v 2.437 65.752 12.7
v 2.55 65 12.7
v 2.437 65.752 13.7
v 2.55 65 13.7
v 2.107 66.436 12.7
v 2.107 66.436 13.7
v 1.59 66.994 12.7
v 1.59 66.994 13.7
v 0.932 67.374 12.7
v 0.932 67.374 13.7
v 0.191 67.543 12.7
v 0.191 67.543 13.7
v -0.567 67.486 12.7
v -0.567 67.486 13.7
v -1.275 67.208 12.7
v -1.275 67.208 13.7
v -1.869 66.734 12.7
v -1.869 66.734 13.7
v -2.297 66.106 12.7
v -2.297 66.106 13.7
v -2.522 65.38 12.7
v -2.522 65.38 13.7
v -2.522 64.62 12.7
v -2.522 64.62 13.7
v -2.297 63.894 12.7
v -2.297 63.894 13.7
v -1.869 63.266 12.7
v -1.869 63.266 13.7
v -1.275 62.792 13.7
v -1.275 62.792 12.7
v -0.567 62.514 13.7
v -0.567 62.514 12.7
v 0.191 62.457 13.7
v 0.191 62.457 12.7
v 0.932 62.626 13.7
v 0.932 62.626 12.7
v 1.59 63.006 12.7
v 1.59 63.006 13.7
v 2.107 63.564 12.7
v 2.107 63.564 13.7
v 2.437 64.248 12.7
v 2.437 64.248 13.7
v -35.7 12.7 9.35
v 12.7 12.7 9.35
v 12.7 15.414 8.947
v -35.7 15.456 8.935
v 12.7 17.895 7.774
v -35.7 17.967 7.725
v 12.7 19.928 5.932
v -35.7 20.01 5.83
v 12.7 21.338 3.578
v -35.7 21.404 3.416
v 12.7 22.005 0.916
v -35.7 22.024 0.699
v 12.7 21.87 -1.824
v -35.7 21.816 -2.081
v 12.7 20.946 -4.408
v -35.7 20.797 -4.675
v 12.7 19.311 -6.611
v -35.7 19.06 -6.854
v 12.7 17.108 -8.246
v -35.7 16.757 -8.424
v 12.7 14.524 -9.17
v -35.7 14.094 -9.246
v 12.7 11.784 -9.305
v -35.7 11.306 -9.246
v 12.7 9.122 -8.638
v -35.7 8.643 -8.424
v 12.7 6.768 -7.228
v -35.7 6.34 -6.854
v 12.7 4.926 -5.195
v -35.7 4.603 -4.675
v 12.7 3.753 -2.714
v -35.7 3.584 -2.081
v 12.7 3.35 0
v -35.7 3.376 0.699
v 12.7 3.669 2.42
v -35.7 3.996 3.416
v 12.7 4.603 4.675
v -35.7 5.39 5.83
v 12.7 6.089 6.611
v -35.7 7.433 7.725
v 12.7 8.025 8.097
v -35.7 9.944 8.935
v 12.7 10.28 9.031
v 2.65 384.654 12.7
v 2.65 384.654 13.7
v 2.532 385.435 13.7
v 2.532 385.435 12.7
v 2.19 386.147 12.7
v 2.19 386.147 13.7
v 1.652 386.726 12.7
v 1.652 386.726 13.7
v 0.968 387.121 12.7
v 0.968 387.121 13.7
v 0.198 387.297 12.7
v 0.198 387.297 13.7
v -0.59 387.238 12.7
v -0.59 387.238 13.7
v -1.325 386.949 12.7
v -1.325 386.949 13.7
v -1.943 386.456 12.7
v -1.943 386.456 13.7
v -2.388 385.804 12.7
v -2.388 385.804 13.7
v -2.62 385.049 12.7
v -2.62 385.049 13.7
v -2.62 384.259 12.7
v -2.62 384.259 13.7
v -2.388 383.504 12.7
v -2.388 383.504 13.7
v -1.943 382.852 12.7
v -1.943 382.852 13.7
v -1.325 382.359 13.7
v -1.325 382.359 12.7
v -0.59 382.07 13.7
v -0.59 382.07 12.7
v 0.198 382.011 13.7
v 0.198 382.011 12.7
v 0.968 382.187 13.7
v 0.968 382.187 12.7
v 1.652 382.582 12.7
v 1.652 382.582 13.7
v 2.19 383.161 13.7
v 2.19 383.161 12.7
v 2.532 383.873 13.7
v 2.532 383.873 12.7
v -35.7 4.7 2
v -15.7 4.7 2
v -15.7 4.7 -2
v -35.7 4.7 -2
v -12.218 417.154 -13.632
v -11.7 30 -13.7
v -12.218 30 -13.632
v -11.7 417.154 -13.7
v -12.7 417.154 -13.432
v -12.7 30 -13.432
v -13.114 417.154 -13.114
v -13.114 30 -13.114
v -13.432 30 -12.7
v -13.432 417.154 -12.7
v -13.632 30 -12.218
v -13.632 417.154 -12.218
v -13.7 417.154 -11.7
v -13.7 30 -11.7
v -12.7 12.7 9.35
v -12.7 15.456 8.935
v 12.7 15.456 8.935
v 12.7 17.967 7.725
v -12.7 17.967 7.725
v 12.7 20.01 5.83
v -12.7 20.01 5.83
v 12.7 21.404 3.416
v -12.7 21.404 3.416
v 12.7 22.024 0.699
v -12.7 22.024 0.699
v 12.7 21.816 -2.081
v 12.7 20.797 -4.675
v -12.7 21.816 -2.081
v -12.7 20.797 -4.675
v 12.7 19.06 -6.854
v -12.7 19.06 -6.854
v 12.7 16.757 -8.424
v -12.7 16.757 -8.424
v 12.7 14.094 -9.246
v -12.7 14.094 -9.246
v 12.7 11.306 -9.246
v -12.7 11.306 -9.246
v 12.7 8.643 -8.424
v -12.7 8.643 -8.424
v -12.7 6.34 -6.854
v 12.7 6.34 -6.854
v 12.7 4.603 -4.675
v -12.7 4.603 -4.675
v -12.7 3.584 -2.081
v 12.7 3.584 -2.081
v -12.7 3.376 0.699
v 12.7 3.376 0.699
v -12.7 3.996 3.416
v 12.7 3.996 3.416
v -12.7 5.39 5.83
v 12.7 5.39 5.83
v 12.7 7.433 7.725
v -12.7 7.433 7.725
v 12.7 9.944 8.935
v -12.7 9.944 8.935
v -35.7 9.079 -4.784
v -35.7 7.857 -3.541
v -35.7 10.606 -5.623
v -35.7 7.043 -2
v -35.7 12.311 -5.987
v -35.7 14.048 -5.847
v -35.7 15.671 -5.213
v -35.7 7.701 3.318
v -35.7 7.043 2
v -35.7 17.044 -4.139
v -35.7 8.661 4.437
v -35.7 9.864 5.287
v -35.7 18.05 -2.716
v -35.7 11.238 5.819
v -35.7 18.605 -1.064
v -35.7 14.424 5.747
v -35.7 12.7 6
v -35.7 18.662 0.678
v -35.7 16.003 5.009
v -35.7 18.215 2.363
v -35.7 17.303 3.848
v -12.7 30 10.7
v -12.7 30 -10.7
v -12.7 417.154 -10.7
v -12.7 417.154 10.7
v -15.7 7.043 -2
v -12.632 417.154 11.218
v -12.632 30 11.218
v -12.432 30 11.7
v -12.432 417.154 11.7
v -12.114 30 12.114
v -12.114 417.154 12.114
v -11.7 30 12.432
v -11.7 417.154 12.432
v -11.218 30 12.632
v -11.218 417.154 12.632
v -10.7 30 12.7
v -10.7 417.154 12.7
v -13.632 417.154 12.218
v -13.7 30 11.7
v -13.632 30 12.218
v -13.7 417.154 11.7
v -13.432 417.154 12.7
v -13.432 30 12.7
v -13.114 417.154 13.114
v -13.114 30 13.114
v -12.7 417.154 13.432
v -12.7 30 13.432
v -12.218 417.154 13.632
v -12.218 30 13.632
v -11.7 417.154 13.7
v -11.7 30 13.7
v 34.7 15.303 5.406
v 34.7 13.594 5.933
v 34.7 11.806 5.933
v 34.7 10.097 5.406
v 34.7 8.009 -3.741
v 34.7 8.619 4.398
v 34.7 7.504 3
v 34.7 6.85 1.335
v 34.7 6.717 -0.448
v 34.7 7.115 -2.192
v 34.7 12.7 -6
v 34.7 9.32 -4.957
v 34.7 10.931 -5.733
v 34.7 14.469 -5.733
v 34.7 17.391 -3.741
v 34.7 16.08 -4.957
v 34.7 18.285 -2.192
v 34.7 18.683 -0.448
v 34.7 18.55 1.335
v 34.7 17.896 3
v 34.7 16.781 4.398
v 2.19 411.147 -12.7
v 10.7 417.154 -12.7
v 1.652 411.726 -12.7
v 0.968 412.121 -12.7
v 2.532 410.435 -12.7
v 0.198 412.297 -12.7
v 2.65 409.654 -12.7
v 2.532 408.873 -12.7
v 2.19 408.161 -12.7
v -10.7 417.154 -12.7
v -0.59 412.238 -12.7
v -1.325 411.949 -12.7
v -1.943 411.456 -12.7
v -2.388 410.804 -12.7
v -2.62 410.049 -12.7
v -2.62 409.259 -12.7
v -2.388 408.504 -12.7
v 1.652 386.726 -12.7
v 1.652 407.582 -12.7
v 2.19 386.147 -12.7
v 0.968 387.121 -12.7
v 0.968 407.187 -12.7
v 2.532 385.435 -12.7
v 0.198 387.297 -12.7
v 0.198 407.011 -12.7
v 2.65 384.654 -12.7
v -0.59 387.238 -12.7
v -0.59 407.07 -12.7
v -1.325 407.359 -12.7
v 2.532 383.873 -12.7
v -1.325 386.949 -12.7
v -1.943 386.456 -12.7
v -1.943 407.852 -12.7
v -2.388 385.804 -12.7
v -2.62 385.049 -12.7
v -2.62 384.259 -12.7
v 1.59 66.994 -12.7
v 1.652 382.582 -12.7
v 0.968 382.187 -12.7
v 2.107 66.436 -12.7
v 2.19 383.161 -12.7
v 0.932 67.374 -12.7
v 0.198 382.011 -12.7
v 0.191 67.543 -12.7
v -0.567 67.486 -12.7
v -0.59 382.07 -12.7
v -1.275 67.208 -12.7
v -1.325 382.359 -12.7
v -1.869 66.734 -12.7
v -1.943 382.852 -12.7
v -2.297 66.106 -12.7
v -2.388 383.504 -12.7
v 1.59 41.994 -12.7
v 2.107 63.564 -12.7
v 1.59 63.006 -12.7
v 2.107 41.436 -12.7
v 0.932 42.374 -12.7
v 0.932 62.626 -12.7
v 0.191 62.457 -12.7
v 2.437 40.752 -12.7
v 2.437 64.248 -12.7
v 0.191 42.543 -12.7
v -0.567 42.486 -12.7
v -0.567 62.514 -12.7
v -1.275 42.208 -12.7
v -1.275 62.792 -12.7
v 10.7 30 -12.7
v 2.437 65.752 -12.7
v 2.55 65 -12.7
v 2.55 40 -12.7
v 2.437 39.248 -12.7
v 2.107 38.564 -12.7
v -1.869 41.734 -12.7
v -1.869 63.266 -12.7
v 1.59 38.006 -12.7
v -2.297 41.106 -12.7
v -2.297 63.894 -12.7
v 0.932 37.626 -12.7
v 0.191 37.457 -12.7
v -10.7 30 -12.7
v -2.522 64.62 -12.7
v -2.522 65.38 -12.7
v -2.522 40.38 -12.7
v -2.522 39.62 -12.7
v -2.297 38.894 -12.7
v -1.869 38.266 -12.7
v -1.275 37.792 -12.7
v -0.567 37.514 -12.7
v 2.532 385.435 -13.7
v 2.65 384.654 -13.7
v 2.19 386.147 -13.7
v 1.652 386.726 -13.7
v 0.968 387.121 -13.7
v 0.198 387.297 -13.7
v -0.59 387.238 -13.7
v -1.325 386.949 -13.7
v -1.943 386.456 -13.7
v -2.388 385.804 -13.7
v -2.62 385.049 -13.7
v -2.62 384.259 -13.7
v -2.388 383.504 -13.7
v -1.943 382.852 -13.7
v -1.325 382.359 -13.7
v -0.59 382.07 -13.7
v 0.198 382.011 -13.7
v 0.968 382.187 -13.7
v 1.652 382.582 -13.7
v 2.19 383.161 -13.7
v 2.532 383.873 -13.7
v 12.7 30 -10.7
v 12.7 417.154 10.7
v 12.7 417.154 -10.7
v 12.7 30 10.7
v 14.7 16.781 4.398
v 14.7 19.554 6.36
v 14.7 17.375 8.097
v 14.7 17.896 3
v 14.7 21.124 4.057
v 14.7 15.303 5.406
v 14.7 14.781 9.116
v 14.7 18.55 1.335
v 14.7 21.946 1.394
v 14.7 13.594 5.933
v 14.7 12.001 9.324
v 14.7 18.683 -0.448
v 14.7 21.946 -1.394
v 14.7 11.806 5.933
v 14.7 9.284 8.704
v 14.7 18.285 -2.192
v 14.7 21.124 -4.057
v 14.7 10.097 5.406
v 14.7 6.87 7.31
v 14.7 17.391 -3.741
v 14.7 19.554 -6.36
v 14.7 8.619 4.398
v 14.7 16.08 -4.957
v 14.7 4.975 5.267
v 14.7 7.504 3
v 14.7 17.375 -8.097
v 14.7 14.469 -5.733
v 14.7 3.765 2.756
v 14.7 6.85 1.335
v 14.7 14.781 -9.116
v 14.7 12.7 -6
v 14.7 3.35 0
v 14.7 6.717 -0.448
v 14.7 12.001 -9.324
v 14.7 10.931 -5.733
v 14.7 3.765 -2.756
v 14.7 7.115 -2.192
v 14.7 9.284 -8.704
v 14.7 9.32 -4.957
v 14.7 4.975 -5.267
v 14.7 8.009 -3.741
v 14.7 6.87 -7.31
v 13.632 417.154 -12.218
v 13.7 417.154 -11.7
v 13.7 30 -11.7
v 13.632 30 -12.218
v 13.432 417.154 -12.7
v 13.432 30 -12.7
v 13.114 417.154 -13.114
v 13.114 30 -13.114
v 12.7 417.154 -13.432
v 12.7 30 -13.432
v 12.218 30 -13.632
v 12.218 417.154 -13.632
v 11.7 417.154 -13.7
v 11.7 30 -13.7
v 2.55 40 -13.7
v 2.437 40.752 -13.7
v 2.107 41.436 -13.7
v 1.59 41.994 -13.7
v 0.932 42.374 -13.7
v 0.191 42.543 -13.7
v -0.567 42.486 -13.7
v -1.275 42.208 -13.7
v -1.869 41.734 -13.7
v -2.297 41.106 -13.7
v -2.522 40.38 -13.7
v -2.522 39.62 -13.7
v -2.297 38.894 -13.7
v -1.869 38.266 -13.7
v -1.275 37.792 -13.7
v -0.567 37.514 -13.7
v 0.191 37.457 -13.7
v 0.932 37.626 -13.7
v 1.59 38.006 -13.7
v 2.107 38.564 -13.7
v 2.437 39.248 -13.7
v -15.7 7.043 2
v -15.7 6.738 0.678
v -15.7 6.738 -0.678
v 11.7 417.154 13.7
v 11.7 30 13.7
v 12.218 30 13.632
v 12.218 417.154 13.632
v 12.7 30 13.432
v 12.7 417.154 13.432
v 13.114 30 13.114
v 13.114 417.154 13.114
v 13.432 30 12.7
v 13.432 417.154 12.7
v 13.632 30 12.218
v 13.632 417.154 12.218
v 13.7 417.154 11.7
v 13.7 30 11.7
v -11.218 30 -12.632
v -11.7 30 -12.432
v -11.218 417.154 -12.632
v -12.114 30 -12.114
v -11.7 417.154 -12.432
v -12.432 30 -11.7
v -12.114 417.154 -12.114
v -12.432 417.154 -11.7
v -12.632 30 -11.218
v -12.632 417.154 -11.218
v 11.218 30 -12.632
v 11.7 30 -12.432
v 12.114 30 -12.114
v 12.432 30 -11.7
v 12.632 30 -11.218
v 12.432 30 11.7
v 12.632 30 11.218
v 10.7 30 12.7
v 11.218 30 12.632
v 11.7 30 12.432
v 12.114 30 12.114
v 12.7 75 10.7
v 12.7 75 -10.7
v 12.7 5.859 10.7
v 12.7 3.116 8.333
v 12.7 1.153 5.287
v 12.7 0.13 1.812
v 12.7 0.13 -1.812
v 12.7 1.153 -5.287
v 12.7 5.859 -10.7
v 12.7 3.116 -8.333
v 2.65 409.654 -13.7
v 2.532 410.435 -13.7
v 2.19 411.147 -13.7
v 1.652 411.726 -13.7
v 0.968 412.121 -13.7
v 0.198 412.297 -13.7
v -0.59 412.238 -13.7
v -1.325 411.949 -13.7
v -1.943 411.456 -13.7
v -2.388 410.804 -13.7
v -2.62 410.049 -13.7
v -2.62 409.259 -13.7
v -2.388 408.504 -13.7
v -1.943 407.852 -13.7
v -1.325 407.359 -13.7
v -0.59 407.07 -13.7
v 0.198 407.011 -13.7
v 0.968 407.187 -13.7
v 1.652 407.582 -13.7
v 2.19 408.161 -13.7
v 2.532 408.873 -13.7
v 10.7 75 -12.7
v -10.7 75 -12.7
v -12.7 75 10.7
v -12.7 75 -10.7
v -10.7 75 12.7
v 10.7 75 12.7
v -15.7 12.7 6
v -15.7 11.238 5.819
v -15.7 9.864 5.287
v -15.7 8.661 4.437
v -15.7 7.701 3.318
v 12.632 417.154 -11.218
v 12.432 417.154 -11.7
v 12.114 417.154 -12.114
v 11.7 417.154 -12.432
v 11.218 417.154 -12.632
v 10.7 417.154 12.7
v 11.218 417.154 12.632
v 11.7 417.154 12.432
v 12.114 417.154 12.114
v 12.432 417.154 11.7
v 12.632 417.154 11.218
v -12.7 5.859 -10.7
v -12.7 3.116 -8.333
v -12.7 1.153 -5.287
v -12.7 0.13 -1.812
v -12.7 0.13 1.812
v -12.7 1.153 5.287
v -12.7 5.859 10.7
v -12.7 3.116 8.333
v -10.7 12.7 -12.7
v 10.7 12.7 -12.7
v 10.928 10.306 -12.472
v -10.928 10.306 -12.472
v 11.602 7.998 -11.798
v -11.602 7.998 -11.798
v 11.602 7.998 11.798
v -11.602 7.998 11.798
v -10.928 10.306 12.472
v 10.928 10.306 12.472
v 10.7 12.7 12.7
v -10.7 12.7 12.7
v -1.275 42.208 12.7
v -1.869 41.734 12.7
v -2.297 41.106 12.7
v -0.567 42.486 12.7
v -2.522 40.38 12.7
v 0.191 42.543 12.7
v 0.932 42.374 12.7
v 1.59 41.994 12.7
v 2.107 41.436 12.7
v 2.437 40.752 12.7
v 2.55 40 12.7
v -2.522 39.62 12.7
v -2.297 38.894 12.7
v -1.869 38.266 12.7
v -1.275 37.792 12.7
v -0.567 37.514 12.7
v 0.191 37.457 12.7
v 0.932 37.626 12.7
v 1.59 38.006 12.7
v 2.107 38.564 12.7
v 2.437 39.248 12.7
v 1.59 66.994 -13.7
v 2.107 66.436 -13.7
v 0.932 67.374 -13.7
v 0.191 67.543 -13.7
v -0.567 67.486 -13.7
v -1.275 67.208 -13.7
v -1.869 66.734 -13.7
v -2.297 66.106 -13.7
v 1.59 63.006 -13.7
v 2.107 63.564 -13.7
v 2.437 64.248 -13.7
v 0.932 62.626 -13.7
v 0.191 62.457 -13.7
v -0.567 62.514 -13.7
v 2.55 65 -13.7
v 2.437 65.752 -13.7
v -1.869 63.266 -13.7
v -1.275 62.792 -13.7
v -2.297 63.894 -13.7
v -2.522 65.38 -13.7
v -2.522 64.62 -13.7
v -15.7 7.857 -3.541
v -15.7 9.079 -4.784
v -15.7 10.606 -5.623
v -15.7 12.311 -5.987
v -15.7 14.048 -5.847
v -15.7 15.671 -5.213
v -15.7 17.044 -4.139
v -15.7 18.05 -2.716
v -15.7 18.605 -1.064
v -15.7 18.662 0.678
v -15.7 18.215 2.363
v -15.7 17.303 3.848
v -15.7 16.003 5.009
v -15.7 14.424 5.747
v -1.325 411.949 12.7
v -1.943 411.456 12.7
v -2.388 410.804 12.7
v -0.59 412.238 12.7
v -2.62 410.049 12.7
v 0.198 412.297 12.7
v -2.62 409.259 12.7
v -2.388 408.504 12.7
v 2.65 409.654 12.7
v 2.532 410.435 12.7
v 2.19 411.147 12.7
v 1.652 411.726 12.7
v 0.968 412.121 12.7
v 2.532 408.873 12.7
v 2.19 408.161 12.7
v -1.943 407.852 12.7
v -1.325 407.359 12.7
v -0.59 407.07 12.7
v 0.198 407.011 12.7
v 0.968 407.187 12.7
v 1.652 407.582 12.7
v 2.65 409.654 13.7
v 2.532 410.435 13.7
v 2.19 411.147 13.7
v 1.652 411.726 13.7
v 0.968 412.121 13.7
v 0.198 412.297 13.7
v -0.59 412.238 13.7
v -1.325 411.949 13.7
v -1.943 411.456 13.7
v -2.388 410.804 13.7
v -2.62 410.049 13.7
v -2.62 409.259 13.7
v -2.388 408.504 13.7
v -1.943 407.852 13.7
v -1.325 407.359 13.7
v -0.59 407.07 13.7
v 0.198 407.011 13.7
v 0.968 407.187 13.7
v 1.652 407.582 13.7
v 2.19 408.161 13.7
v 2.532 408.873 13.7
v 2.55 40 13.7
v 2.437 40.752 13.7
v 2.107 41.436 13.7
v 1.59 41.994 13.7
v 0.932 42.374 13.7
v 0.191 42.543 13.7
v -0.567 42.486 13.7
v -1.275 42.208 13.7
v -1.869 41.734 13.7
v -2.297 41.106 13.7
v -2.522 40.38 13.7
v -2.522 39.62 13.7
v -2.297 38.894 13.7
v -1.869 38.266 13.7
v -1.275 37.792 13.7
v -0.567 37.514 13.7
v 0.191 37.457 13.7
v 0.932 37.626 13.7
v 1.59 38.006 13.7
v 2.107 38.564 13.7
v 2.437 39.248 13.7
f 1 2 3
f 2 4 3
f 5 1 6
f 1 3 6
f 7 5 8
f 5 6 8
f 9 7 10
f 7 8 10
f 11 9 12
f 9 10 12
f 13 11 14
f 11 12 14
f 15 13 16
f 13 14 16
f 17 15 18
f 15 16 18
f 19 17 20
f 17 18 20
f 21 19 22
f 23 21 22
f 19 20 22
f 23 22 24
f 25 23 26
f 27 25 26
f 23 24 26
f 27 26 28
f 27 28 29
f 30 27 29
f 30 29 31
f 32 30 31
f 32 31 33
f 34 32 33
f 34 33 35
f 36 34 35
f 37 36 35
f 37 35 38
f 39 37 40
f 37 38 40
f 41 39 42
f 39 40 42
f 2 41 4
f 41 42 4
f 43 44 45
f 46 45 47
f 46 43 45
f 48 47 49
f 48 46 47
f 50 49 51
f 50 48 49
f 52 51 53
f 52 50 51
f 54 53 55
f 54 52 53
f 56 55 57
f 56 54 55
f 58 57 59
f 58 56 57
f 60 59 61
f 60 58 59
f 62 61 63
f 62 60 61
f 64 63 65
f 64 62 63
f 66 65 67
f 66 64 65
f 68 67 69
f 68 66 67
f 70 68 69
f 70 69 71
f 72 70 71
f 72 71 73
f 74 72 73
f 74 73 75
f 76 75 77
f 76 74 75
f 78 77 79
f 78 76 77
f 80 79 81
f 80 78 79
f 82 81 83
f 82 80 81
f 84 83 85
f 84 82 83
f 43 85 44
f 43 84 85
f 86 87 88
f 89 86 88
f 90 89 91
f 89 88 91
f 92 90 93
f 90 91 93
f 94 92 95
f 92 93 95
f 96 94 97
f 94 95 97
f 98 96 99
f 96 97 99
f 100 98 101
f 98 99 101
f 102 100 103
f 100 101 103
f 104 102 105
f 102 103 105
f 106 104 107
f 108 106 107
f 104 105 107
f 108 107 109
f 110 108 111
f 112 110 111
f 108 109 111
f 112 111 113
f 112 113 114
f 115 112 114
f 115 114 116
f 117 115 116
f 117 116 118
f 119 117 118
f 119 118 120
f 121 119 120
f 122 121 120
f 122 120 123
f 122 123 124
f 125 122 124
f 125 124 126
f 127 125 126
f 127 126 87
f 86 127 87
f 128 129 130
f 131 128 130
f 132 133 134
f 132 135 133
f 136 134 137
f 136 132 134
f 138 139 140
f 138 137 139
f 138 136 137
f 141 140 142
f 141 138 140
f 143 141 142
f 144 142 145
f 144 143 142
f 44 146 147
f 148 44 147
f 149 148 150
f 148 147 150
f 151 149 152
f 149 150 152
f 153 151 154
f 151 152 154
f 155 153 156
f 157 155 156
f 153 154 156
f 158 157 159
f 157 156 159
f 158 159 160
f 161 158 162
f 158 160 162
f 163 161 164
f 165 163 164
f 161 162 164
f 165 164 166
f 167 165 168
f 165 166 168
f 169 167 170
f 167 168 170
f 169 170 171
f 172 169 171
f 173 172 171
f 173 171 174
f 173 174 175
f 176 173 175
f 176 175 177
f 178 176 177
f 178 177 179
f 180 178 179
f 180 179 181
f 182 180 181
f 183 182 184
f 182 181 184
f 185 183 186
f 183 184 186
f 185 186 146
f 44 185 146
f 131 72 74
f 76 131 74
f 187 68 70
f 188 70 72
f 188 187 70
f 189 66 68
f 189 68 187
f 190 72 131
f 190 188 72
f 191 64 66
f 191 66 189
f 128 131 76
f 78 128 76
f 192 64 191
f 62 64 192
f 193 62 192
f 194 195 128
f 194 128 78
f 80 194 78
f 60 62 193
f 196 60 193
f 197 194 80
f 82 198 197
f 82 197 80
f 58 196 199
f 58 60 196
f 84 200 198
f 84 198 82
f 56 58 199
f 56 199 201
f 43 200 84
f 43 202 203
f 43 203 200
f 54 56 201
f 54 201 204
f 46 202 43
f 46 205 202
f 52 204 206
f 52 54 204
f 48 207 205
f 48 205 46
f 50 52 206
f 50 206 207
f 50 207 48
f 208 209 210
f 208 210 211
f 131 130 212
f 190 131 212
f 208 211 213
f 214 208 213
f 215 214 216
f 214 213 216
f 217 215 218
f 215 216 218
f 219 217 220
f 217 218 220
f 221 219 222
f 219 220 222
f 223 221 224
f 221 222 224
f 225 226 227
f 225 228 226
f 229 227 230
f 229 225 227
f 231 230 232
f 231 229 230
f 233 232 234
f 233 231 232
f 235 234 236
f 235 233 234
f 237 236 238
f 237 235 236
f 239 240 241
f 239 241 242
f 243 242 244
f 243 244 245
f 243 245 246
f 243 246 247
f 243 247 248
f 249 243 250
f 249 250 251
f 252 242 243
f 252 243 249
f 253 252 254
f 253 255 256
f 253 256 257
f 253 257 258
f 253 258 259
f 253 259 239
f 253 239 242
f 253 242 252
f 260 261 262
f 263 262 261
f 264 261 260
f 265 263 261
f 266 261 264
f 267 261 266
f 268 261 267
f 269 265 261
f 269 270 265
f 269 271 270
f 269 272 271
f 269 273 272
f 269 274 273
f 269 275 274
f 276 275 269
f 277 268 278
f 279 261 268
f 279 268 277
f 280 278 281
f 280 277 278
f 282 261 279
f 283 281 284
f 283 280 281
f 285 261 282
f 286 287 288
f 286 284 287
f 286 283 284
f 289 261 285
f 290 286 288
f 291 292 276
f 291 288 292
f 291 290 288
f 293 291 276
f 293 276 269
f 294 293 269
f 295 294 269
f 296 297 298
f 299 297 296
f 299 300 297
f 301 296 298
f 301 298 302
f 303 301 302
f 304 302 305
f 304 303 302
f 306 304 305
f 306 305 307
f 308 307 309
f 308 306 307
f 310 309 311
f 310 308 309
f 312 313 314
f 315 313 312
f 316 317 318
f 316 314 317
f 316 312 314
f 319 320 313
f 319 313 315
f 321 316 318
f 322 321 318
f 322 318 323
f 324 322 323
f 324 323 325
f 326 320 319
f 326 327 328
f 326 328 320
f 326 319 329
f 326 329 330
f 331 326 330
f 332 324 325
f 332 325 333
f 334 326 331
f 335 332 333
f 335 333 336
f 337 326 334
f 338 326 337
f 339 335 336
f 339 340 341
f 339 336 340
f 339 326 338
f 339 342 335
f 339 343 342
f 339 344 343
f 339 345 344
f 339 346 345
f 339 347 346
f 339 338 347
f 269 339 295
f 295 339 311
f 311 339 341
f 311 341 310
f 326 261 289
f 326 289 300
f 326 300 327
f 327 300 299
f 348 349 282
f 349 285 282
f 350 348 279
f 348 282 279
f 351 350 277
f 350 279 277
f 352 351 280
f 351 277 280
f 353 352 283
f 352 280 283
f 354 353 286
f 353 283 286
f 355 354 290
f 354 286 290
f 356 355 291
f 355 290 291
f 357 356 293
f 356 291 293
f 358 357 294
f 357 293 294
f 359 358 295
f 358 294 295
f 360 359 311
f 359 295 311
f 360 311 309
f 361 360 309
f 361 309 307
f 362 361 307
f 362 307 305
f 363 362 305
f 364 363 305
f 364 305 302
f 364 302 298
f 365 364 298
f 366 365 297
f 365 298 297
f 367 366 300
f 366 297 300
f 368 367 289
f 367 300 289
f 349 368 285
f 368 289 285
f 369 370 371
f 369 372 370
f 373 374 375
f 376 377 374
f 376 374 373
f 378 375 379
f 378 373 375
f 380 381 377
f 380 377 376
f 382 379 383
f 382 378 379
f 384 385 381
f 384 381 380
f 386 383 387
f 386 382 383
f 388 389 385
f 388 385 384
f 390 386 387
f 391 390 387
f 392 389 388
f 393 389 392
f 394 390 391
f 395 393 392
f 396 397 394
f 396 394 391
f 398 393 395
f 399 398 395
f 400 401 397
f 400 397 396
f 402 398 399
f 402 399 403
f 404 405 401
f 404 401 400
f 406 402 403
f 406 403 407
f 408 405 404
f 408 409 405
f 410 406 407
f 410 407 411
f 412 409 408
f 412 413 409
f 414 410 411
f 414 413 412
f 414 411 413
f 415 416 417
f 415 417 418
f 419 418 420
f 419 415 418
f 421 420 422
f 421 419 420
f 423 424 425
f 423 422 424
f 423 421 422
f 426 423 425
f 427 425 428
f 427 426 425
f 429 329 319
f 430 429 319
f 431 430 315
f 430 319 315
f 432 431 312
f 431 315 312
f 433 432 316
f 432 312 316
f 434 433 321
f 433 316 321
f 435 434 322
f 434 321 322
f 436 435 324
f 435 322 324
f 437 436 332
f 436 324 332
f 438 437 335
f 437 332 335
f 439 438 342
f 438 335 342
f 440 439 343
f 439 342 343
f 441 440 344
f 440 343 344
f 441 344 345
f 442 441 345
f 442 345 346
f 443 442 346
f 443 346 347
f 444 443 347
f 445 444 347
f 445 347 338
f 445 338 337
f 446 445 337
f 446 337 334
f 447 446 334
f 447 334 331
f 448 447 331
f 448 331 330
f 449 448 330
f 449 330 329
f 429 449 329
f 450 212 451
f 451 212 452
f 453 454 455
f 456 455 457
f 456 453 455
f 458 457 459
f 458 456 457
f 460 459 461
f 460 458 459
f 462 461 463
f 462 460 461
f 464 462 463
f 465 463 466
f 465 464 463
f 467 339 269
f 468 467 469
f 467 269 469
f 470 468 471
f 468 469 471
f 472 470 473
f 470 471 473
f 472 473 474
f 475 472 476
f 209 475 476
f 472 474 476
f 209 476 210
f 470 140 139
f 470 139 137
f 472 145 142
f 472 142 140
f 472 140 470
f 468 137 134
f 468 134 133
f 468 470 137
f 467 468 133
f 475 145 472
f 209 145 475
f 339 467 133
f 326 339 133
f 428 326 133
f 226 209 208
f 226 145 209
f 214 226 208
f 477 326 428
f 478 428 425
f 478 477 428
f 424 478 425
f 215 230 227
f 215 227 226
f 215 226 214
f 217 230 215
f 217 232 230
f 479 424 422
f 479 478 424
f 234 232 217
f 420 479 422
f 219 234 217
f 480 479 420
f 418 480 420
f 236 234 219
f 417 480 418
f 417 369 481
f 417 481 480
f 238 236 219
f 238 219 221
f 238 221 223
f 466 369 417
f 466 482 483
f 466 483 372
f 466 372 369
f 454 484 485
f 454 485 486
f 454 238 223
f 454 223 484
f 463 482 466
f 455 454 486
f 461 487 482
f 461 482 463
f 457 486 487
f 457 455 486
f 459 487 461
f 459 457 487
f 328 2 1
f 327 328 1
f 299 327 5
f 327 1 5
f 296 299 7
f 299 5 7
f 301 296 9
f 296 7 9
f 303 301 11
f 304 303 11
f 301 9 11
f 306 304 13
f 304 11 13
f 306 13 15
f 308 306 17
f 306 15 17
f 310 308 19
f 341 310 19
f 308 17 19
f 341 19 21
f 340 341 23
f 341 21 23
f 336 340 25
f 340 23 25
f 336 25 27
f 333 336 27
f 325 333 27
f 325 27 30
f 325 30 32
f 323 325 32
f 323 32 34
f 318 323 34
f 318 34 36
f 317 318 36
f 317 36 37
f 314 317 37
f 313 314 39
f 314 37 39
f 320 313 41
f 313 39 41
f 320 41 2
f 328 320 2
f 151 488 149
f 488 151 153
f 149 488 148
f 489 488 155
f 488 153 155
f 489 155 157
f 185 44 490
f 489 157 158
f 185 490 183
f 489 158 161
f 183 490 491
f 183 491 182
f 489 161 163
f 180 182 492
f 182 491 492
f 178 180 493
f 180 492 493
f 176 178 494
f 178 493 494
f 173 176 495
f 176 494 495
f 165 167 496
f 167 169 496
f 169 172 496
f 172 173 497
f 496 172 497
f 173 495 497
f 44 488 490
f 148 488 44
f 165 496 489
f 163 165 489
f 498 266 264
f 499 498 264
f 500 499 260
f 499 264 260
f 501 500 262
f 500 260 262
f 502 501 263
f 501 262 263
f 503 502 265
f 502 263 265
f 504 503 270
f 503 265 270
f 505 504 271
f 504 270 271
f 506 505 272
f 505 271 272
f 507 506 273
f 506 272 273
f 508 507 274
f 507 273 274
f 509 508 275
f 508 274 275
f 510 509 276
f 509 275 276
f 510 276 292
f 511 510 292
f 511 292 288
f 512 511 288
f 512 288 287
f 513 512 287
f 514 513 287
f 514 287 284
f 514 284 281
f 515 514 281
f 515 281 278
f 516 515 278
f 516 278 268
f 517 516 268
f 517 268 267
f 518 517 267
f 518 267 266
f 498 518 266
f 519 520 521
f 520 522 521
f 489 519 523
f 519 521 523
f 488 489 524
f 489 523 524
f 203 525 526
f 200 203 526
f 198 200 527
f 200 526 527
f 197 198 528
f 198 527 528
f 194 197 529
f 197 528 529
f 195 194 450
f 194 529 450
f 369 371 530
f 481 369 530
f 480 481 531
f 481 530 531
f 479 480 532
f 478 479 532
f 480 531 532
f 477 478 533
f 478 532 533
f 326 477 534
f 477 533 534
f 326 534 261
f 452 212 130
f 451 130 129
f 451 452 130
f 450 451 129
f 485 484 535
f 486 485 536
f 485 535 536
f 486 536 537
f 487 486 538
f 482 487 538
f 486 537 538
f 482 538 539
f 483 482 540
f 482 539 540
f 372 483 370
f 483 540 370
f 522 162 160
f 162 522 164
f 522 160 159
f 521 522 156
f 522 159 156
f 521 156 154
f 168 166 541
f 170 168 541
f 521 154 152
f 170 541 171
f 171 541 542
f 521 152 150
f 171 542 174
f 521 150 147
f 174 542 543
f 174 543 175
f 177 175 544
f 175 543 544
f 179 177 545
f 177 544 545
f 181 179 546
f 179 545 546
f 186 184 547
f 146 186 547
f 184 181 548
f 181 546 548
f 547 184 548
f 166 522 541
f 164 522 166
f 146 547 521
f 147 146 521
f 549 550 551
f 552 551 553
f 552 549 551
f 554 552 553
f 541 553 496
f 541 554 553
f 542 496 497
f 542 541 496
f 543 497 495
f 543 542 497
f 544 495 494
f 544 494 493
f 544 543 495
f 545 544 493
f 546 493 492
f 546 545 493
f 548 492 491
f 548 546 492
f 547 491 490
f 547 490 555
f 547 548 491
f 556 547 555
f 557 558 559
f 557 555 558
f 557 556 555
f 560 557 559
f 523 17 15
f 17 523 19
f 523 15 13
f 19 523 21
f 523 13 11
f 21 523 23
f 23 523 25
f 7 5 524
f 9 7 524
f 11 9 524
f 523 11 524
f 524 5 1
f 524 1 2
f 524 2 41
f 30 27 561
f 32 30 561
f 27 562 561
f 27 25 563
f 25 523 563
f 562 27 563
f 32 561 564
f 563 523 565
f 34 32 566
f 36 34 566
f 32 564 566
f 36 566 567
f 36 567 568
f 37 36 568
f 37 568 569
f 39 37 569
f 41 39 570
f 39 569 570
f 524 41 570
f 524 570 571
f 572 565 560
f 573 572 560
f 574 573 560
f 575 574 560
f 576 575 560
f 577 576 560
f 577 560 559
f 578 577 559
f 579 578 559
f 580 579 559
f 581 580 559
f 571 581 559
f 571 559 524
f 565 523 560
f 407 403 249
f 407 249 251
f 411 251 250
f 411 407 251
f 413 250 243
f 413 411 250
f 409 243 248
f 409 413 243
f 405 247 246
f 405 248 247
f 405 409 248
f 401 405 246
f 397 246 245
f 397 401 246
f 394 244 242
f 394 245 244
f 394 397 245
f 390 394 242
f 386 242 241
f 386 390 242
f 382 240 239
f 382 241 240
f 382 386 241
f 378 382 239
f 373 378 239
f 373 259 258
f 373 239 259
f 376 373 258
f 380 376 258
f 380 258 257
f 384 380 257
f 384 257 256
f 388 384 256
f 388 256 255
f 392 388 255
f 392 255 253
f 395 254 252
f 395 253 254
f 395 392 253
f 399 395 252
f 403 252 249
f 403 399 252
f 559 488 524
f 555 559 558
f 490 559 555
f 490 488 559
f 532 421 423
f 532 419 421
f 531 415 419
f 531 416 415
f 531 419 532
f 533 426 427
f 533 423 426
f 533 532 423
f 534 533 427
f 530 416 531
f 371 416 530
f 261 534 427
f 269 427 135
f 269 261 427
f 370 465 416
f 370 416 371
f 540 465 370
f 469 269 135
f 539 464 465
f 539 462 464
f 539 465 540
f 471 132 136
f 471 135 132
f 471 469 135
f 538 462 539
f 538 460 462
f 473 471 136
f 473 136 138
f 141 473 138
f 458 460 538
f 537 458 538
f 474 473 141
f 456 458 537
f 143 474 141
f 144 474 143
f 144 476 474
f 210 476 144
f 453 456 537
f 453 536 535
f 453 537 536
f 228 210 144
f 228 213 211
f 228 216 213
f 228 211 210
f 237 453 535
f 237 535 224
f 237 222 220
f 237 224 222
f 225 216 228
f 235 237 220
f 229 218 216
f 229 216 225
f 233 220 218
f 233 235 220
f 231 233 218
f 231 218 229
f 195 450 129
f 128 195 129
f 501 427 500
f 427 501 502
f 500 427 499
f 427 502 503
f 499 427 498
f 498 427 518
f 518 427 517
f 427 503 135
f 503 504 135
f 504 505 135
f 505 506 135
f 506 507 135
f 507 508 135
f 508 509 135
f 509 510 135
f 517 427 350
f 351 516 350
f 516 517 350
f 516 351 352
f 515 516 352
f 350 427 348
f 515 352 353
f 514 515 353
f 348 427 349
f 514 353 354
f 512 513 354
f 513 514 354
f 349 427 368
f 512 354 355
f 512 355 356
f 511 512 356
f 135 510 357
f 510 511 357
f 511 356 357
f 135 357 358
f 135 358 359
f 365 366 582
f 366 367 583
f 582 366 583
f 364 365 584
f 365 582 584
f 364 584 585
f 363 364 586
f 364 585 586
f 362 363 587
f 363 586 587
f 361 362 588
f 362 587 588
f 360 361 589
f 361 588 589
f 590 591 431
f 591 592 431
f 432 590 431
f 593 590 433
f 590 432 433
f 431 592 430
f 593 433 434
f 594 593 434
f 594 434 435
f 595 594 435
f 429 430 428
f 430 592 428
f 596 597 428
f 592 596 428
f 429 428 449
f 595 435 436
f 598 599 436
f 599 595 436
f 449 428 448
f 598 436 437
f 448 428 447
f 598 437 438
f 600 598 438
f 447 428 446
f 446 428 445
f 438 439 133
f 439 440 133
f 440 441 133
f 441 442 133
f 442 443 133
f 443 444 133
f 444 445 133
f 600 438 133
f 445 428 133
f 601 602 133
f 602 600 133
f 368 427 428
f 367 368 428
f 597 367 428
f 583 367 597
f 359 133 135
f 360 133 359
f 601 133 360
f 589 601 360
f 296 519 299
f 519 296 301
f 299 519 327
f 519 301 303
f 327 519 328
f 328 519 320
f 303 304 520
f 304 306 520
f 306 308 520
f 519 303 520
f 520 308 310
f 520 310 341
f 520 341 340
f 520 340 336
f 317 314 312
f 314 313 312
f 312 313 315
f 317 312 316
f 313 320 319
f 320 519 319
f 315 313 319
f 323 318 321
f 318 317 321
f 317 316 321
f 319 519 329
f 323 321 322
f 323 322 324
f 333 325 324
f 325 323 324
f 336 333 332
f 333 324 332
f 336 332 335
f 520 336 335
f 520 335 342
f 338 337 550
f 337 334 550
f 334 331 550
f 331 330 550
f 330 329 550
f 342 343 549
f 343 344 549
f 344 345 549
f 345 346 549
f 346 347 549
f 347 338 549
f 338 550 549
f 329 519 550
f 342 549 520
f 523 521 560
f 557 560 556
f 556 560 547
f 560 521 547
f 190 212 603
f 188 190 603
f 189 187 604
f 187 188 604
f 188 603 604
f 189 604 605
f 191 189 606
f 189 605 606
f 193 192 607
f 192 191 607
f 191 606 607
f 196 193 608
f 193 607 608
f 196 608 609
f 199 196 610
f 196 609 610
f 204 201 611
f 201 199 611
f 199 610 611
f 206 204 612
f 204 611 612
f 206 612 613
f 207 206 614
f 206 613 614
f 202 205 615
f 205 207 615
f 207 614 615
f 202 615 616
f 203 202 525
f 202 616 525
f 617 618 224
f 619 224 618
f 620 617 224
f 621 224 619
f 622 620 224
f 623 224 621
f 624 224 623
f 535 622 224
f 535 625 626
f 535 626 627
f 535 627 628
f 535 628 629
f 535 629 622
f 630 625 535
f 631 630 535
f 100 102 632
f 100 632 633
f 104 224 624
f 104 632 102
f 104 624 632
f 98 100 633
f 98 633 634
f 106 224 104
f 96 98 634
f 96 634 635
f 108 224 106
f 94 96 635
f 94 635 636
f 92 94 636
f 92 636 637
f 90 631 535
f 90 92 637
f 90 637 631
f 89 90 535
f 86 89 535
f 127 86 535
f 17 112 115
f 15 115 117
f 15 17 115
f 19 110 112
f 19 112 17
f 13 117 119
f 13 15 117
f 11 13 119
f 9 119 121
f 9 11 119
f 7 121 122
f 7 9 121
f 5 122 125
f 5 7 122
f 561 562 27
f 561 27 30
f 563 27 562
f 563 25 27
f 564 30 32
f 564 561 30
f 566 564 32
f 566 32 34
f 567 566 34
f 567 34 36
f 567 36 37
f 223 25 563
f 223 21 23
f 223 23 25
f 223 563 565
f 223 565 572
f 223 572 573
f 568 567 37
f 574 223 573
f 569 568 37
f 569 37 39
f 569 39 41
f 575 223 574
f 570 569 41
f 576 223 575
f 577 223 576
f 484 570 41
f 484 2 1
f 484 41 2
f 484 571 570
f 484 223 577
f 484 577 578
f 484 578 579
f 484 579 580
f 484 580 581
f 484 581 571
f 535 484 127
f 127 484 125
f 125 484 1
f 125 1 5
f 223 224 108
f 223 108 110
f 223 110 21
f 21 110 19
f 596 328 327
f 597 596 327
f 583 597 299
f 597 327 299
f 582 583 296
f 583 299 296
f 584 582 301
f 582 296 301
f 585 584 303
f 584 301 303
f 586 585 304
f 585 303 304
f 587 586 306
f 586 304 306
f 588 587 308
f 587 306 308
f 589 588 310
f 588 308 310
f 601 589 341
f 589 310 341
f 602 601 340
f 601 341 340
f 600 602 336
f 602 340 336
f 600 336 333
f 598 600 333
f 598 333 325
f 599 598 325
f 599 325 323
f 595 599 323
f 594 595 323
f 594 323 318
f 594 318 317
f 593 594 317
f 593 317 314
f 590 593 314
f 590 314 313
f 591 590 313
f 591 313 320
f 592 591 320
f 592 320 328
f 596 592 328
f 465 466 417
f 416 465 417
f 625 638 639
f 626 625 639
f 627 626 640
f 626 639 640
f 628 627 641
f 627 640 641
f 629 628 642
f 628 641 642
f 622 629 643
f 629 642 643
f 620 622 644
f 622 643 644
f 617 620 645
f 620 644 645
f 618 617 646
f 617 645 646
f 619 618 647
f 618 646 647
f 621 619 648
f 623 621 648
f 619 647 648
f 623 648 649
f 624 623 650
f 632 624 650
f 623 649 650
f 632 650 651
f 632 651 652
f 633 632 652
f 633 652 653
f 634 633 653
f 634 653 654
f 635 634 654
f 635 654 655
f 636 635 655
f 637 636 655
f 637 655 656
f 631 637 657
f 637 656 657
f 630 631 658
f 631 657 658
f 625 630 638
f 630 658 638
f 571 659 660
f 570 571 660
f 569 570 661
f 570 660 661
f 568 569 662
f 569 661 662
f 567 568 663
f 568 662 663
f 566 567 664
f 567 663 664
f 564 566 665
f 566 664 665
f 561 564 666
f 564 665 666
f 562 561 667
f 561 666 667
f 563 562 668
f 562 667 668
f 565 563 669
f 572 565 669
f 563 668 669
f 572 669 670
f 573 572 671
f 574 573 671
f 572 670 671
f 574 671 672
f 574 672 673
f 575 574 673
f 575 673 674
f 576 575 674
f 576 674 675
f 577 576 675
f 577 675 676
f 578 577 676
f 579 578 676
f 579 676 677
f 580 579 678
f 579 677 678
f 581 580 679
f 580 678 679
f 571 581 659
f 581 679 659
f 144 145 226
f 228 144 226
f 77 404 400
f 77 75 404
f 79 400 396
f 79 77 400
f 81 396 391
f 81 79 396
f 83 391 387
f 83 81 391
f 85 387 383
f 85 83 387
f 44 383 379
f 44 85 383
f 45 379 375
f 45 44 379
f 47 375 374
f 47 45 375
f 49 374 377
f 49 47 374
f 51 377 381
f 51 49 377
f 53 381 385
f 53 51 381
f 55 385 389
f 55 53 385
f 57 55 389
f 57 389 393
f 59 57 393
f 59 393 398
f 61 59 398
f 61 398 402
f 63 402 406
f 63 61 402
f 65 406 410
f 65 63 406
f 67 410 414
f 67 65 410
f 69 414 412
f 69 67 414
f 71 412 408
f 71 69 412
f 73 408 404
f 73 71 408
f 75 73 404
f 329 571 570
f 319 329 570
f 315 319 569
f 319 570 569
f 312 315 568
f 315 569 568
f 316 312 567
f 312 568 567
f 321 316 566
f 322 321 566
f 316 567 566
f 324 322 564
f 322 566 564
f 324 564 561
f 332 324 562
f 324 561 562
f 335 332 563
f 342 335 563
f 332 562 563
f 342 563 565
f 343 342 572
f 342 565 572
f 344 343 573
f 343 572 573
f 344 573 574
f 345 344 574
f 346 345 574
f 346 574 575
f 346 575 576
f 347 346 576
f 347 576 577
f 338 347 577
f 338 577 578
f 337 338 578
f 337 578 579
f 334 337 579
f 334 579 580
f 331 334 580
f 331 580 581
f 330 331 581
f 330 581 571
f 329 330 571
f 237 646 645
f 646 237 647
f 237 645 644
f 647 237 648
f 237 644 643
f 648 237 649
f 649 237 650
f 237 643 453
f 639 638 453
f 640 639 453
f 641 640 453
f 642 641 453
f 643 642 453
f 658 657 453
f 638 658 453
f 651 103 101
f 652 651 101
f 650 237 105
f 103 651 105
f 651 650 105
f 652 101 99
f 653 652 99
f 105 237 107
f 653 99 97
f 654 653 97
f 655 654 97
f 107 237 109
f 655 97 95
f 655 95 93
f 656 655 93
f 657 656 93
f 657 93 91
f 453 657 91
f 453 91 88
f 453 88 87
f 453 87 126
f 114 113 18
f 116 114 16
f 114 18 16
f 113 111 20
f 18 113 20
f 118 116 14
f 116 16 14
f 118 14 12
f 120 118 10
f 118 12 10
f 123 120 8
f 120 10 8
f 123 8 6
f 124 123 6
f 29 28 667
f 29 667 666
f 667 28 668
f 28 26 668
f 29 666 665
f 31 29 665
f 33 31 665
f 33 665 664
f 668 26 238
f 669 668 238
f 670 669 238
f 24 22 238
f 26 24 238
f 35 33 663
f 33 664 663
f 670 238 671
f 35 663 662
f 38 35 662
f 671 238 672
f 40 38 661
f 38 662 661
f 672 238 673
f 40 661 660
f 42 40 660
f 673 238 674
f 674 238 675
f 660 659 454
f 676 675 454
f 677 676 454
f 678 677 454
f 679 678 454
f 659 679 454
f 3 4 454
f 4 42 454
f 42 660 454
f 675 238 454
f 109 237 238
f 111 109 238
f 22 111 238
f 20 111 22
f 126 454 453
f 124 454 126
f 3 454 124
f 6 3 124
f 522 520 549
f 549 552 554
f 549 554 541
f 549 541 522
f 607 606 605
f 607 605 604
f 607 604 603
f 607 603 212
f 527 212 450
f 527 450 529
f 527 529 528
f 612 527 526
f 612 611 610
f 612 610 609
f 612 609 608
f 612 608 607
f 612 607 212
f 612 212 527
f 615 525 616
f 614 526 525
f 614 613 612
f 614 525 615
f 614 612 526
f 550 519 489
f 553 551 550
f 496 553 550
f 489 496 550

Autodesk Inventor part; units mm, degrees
ref_plane "YZ Plane" through (0, 0, 0) normal (1, 0, 0) x (0, 1, 0)
ref_plane "XZ Plane" through (0, 0, 0) normal (0, 1, 0) x (-1, 0, 0)
sketch "Sketch1" plane through (0, 0, 0) normal (0, 1, 0) x (-1, 0, 0)
  line L0 (13.7, 13.7) -> (-13.7, 13.7)
  line L1 (-13.7, 13.7) -> (-13.7, -13.7)
  line L2 (-13.7, -13.7) -> (13.7, -13.7)
  line L3 (13.7, -13.7) -> (13.7, 13.7)
  line L4 (13.7, 13.7) -> (-13.7, -13.7) construction
  line L5 (-13.7, 13.7) -> (13.7, -13.7) construction
  line L6 (-12.7, -12.7) -> (12.7, -12.7)
  line L7 (12.7, -12.7) -> (12.7, 12.7)
  line L8 (12.7, 12.7) -> (-12.7, 12.7)
  line L9 (-12.7, 12.7) -> (-12.7, -12.7)
  line L10 (-12.7, -12.7) -> (12.7, 12.7) construction
  line L11 (12.7, -12.7) -> (-12.7, 12.7) construction
  point P0 (0, 0)
  dimension "d1" = 1
  dimension "d35" = 25.4
extrude "Extrusion1" add sketch "Sketch1" along normal blind 417.154
fillet "Fillet1" radius 2 8 edges at (-12.7, 208.577, 12.7) (13.7, 208.577, -13.7) (-13.7, 208.577, -13.7) (12.7, 208.577, -12.7) (-12.7, 208.577, -12.7) (12.7, 208.577, 12.7) (13.7, 208.577, 13.7) (-13.7, 208.577, 13.7)
ref_plane "Work Plane1" through (-13.7, 417.154, 13.7) normal (0, 0.7504226, 0.6609583) x (1, 0, 0)
sketch "Sketch4" plane through (0, 0, 0) normal (0, -1, 0) x (1, 0, 0)
  line L0 (12.7, -12.7) -> (-12.7, -12.7)
  line L1 (-12.7, -12.7) -> (-12.7, 12.7)
  line L2 (-12.7, 12.7) -> (12.7, 12.7)
  line L3 (12.7, 12.7) -> (12.7, -12.7)
  line L4 (12.7, -12.7) -> (-12.7, 12.7) construction
  line L5 (-12.7, -12.7) -> (12.7, 12.7) construction
  line L6 (12.7, 12.7) -> (-12.7, 12.7) projected
  point P0 (0, 0)
  dimension "d9" = 0
extrude "Extrusion3" add sketch "Sketch4" against normal blind 75 separate body
sketch "Sketch6" plane through (0, 0, 0) normal (0, -1, 0) x (1, 0, 0)
  line L0 (13.7, 11.7) -> (13.7, -11.7) projected
  line L1 (-11.7, 13.7) -> (11.7, 13.7) projected
  line L2 (-13.7, -11.7) -> (-13.7, 11.7) projected
  line L3 (11.7, -13.7) -> (-11.7, -13.7) projected
  line L4 (12.7, -10.7) -> (12.7, 10.7) projected
  line L5 (-10.7, -12.7) -> (10.7, -12.7) projected
  line L6 (-12.7, 10.7) -> (-12.7, -10.7) projected
  line L7 (10.7, 12.7) -> (-10.7, 12.7) projected
  arc A0 (-11.7, 13.7) -> (-13.7, 11.7) centre (-11.7, 11.7) ccw projected
  arc A1 (-13.7, -11.7) -> (-11.7, -13.7) centre (-11.7, -11.7) ccw projected
  arc A2 (11.7, -13.7) -> (13.7, -11.7) centre (11.7, -11.7) ccw projected
  arc A3 (13.7, 11.7) -> (11.7, 13.7) centre (11.7, 11.7) ccw projected
  arc A4 (10.7, -12.7) -> (12.7, -10.7) centre (10.7, -10.7) ccw projected
  arc A5 (-12.7, -10.7) -> (-10.7, -12.7) centre (-10.7, -10.7) ccw projected
  arc A6 (-10.7, 12.7) -> (-12.7, 10.7) centre (-10.7, 10.7) ccw projected
  arc A7 (12.7, 10.7) -> (10.7, 12.7) centre (10.7, 10.7) ccw projected
  point P0 (0, 0)
extrude "Extrusion5" cut sketch "Sketch6" against normal blind 30 contours L0 A2 L3 A1 L2 A0 L1 A3 | A4 L5 A5 L6 A6 L7 A7 L4 bodies 1
sketch "Sketch7" plane through (-13.7, 417.154, 13.7) normal (0, 0, 1) x (1, 0, 0)
  line L0 (13.7, -377.154) -> (13.7, -352.154) construction
  line L1 (13.7, -352.154) -> (13.7, -342.154) construction
  line L2 (13.7, -377.154) -> (13.7, -387.154) construction
  circle A0 centre (13.7, -352.154) radius 2.55
  circle A1 centre (13.7, -377.154) radius 2.55
  line L3 (1, -342.154) -> (26.4, -342.154) projected
  line L4 (2, -387.154) -> (25.4, -387.154) projected
  point P0 (0, -299.6)
  point P1 (27.4, -299.6)
  dimension "d20" = 5.1
  dimension "d21" = 10
extrude "Extrusion6" cut sketch "Sketch7" against normal through all bodies 1 2
sketch "Sketch8" plane through (-13.7, 417.154, 13.7) normal (0, 0, 1) x (1, 0, 0)
  line L0 (27.4, 0) -> (0, 0) projected
  line L1 (13.7, 0) -> (13.7, -7.5) construction
  line L2 (13.7, -7.5) -> (13.7, -32.5) construction
  circle A0 centre (13.7, -7.5) radius 2.65
  circle A1 centre (13.7, -32.5) radius 2.65
  point P0 (13.7, -417.154)
  point P1 (27.4, -299.6)
  point P2 (0, -299.6)
  dimension "d26" = 7.5
  dimension "d27" = 25
  dimension "d28" = 5.3
  dimension "d29" = 5.3
extrude "Extrusion7" cut sketch "Sketch8" against normal through all bodies 1
sketch "Sketch13" plane through (-12.7, 0, -12.7) normal (-1, 0, 0) x (0, 0, 1)
  line L0 (0, 0) -> (0, 75) projected
  line L1 (25.4, 0) -> (0, 0) projected
  line L2 (25.4, 0) -> (25.4, 75) projected
  circle A0 centre (12.7, 12.7) radius 6 construction
  circle A1 centre (12.7, 12.7) radius 9.35
  circle A2 centre (12.7, 12.7) radius 12.7
  line L3 (12.7, 12.7) -> (6.7, 12.7) construction
  line L4 (3.35, 12.7) -> (0, 12.7) construction
  line L5 (0, 0) -> (0, 75) projected
  line L6 (3.35, 12.7) -> (6.7, 12.7) construction
  point P0 (12.7, 0)
  point P1 (6.1952, 0)
  point P2 (25.4, 12.7)
  point P3 (12.7, 0)
  point P4 (5.5838, 6.6351)
  point P5 (19.8162, 6.6351)
  point P6 (19.8162, 18.7649)
  point P7 (5.5838, 18.7649)
  dimension "d58" = 12
  dimension "d68" = 3.35
extrude "Extrusion14" cut sketch "Sketch13" against normal through all contours L0 A2 L1 | A2 L2 L1 | A1 bodies 2
extrude "Extrusion15" add sketch "Sketch13" against normal up to surface (25.4 mm away) separate body contours A1
sketch "Sketch15" plane through (-12.7, 0, -12.7) normal (-1, 0, 0) x (0, 0, 1)
  circle A0 centre (12.7, 12.7) radius 9.35 projected
  circle A1 centre (12.7, 12.7) radius 9.35
  circle A2 centre (12.7, 12.7) radius 6
  point P0 (12.7, 0)
  point P1 (19.5401, 6.5)
  point P2 (22.05, 12.7)
  dimension "d70" = 12
extrude "Extrusion16" add sketch "Sketch15" along normal blind 23 bodies 3
sketch "Sketch16" plane through (-12.7, 12.7, 0) normal (-1, 0, 0) x (0, 0, 1)
  circle A0 centre (0, 0) radius 6 projected
  point P0 (0, -12.7)
extrude "Extrusion17" add sketch "Sketch16" along normal blind 3 bodies 3
sketch "Sketch19" plane through (12.7, 12.7, 0) normal (1, 0, 0) x (0, -1, 0)
  circle A0 centre (0, 0) radius 9.35 projected
  point P0 (12.7, 0)
extrude "Extrusion20" add sketch "Sketch19" along normal blind 2 bodies 3
sketch "Sketch17" plane through (14.7, 12.7, 0) normal (1, 0, 0) x (0, 0, -1)
  circle A0 centre (0, 0) radius 6
  point P0 (0, -12.7)
  dimension "d75" = 12
extrude "Extrusion18" add sketch "Sketch17" along normal blind 20 bodies 3
sketch "Sketch18" plane through (-35.7, 12.7, 0) normal (-1, 0, 0) x (0, 0, 1)
  circle A0 centre (0, 0) radius 6 projected
  line L0 (-2, -5.6569) -> (2, -5.6569)
  line L1 (2, -5.6569) -> (2, -8)
  line L2 (2, -8) -> (-2, -8)
  line L3 (-2, -8) -> (-2, -5.6569)
  line L4 (0, -5.6569) -> (0, -6) construction
  point P0 (0, -12.7)
  point P1 (-1.94, -6.1429)
  point P2 (-1.94, -6.1429)
  dimension "d85" = 4
  dimension "d97" = 2
extrude "Extrusion19" cut sketch "Sketch18" against normal up to surface (20 mm away) contours L0 A0 | A0 L1 L2 L3 picked at (-0.2261, -5.7584) bodies 3
chamfer "Chamfer1" distance 2 angle 45 4 edges at (12.7, 43.85, 12.7) (-12.7, 43.85, 12.7) (12.7, 43.85, -12.7) (-12.7, 43.85, -12.7)
properties part number "Brazo" material "Aluminum 6061"
